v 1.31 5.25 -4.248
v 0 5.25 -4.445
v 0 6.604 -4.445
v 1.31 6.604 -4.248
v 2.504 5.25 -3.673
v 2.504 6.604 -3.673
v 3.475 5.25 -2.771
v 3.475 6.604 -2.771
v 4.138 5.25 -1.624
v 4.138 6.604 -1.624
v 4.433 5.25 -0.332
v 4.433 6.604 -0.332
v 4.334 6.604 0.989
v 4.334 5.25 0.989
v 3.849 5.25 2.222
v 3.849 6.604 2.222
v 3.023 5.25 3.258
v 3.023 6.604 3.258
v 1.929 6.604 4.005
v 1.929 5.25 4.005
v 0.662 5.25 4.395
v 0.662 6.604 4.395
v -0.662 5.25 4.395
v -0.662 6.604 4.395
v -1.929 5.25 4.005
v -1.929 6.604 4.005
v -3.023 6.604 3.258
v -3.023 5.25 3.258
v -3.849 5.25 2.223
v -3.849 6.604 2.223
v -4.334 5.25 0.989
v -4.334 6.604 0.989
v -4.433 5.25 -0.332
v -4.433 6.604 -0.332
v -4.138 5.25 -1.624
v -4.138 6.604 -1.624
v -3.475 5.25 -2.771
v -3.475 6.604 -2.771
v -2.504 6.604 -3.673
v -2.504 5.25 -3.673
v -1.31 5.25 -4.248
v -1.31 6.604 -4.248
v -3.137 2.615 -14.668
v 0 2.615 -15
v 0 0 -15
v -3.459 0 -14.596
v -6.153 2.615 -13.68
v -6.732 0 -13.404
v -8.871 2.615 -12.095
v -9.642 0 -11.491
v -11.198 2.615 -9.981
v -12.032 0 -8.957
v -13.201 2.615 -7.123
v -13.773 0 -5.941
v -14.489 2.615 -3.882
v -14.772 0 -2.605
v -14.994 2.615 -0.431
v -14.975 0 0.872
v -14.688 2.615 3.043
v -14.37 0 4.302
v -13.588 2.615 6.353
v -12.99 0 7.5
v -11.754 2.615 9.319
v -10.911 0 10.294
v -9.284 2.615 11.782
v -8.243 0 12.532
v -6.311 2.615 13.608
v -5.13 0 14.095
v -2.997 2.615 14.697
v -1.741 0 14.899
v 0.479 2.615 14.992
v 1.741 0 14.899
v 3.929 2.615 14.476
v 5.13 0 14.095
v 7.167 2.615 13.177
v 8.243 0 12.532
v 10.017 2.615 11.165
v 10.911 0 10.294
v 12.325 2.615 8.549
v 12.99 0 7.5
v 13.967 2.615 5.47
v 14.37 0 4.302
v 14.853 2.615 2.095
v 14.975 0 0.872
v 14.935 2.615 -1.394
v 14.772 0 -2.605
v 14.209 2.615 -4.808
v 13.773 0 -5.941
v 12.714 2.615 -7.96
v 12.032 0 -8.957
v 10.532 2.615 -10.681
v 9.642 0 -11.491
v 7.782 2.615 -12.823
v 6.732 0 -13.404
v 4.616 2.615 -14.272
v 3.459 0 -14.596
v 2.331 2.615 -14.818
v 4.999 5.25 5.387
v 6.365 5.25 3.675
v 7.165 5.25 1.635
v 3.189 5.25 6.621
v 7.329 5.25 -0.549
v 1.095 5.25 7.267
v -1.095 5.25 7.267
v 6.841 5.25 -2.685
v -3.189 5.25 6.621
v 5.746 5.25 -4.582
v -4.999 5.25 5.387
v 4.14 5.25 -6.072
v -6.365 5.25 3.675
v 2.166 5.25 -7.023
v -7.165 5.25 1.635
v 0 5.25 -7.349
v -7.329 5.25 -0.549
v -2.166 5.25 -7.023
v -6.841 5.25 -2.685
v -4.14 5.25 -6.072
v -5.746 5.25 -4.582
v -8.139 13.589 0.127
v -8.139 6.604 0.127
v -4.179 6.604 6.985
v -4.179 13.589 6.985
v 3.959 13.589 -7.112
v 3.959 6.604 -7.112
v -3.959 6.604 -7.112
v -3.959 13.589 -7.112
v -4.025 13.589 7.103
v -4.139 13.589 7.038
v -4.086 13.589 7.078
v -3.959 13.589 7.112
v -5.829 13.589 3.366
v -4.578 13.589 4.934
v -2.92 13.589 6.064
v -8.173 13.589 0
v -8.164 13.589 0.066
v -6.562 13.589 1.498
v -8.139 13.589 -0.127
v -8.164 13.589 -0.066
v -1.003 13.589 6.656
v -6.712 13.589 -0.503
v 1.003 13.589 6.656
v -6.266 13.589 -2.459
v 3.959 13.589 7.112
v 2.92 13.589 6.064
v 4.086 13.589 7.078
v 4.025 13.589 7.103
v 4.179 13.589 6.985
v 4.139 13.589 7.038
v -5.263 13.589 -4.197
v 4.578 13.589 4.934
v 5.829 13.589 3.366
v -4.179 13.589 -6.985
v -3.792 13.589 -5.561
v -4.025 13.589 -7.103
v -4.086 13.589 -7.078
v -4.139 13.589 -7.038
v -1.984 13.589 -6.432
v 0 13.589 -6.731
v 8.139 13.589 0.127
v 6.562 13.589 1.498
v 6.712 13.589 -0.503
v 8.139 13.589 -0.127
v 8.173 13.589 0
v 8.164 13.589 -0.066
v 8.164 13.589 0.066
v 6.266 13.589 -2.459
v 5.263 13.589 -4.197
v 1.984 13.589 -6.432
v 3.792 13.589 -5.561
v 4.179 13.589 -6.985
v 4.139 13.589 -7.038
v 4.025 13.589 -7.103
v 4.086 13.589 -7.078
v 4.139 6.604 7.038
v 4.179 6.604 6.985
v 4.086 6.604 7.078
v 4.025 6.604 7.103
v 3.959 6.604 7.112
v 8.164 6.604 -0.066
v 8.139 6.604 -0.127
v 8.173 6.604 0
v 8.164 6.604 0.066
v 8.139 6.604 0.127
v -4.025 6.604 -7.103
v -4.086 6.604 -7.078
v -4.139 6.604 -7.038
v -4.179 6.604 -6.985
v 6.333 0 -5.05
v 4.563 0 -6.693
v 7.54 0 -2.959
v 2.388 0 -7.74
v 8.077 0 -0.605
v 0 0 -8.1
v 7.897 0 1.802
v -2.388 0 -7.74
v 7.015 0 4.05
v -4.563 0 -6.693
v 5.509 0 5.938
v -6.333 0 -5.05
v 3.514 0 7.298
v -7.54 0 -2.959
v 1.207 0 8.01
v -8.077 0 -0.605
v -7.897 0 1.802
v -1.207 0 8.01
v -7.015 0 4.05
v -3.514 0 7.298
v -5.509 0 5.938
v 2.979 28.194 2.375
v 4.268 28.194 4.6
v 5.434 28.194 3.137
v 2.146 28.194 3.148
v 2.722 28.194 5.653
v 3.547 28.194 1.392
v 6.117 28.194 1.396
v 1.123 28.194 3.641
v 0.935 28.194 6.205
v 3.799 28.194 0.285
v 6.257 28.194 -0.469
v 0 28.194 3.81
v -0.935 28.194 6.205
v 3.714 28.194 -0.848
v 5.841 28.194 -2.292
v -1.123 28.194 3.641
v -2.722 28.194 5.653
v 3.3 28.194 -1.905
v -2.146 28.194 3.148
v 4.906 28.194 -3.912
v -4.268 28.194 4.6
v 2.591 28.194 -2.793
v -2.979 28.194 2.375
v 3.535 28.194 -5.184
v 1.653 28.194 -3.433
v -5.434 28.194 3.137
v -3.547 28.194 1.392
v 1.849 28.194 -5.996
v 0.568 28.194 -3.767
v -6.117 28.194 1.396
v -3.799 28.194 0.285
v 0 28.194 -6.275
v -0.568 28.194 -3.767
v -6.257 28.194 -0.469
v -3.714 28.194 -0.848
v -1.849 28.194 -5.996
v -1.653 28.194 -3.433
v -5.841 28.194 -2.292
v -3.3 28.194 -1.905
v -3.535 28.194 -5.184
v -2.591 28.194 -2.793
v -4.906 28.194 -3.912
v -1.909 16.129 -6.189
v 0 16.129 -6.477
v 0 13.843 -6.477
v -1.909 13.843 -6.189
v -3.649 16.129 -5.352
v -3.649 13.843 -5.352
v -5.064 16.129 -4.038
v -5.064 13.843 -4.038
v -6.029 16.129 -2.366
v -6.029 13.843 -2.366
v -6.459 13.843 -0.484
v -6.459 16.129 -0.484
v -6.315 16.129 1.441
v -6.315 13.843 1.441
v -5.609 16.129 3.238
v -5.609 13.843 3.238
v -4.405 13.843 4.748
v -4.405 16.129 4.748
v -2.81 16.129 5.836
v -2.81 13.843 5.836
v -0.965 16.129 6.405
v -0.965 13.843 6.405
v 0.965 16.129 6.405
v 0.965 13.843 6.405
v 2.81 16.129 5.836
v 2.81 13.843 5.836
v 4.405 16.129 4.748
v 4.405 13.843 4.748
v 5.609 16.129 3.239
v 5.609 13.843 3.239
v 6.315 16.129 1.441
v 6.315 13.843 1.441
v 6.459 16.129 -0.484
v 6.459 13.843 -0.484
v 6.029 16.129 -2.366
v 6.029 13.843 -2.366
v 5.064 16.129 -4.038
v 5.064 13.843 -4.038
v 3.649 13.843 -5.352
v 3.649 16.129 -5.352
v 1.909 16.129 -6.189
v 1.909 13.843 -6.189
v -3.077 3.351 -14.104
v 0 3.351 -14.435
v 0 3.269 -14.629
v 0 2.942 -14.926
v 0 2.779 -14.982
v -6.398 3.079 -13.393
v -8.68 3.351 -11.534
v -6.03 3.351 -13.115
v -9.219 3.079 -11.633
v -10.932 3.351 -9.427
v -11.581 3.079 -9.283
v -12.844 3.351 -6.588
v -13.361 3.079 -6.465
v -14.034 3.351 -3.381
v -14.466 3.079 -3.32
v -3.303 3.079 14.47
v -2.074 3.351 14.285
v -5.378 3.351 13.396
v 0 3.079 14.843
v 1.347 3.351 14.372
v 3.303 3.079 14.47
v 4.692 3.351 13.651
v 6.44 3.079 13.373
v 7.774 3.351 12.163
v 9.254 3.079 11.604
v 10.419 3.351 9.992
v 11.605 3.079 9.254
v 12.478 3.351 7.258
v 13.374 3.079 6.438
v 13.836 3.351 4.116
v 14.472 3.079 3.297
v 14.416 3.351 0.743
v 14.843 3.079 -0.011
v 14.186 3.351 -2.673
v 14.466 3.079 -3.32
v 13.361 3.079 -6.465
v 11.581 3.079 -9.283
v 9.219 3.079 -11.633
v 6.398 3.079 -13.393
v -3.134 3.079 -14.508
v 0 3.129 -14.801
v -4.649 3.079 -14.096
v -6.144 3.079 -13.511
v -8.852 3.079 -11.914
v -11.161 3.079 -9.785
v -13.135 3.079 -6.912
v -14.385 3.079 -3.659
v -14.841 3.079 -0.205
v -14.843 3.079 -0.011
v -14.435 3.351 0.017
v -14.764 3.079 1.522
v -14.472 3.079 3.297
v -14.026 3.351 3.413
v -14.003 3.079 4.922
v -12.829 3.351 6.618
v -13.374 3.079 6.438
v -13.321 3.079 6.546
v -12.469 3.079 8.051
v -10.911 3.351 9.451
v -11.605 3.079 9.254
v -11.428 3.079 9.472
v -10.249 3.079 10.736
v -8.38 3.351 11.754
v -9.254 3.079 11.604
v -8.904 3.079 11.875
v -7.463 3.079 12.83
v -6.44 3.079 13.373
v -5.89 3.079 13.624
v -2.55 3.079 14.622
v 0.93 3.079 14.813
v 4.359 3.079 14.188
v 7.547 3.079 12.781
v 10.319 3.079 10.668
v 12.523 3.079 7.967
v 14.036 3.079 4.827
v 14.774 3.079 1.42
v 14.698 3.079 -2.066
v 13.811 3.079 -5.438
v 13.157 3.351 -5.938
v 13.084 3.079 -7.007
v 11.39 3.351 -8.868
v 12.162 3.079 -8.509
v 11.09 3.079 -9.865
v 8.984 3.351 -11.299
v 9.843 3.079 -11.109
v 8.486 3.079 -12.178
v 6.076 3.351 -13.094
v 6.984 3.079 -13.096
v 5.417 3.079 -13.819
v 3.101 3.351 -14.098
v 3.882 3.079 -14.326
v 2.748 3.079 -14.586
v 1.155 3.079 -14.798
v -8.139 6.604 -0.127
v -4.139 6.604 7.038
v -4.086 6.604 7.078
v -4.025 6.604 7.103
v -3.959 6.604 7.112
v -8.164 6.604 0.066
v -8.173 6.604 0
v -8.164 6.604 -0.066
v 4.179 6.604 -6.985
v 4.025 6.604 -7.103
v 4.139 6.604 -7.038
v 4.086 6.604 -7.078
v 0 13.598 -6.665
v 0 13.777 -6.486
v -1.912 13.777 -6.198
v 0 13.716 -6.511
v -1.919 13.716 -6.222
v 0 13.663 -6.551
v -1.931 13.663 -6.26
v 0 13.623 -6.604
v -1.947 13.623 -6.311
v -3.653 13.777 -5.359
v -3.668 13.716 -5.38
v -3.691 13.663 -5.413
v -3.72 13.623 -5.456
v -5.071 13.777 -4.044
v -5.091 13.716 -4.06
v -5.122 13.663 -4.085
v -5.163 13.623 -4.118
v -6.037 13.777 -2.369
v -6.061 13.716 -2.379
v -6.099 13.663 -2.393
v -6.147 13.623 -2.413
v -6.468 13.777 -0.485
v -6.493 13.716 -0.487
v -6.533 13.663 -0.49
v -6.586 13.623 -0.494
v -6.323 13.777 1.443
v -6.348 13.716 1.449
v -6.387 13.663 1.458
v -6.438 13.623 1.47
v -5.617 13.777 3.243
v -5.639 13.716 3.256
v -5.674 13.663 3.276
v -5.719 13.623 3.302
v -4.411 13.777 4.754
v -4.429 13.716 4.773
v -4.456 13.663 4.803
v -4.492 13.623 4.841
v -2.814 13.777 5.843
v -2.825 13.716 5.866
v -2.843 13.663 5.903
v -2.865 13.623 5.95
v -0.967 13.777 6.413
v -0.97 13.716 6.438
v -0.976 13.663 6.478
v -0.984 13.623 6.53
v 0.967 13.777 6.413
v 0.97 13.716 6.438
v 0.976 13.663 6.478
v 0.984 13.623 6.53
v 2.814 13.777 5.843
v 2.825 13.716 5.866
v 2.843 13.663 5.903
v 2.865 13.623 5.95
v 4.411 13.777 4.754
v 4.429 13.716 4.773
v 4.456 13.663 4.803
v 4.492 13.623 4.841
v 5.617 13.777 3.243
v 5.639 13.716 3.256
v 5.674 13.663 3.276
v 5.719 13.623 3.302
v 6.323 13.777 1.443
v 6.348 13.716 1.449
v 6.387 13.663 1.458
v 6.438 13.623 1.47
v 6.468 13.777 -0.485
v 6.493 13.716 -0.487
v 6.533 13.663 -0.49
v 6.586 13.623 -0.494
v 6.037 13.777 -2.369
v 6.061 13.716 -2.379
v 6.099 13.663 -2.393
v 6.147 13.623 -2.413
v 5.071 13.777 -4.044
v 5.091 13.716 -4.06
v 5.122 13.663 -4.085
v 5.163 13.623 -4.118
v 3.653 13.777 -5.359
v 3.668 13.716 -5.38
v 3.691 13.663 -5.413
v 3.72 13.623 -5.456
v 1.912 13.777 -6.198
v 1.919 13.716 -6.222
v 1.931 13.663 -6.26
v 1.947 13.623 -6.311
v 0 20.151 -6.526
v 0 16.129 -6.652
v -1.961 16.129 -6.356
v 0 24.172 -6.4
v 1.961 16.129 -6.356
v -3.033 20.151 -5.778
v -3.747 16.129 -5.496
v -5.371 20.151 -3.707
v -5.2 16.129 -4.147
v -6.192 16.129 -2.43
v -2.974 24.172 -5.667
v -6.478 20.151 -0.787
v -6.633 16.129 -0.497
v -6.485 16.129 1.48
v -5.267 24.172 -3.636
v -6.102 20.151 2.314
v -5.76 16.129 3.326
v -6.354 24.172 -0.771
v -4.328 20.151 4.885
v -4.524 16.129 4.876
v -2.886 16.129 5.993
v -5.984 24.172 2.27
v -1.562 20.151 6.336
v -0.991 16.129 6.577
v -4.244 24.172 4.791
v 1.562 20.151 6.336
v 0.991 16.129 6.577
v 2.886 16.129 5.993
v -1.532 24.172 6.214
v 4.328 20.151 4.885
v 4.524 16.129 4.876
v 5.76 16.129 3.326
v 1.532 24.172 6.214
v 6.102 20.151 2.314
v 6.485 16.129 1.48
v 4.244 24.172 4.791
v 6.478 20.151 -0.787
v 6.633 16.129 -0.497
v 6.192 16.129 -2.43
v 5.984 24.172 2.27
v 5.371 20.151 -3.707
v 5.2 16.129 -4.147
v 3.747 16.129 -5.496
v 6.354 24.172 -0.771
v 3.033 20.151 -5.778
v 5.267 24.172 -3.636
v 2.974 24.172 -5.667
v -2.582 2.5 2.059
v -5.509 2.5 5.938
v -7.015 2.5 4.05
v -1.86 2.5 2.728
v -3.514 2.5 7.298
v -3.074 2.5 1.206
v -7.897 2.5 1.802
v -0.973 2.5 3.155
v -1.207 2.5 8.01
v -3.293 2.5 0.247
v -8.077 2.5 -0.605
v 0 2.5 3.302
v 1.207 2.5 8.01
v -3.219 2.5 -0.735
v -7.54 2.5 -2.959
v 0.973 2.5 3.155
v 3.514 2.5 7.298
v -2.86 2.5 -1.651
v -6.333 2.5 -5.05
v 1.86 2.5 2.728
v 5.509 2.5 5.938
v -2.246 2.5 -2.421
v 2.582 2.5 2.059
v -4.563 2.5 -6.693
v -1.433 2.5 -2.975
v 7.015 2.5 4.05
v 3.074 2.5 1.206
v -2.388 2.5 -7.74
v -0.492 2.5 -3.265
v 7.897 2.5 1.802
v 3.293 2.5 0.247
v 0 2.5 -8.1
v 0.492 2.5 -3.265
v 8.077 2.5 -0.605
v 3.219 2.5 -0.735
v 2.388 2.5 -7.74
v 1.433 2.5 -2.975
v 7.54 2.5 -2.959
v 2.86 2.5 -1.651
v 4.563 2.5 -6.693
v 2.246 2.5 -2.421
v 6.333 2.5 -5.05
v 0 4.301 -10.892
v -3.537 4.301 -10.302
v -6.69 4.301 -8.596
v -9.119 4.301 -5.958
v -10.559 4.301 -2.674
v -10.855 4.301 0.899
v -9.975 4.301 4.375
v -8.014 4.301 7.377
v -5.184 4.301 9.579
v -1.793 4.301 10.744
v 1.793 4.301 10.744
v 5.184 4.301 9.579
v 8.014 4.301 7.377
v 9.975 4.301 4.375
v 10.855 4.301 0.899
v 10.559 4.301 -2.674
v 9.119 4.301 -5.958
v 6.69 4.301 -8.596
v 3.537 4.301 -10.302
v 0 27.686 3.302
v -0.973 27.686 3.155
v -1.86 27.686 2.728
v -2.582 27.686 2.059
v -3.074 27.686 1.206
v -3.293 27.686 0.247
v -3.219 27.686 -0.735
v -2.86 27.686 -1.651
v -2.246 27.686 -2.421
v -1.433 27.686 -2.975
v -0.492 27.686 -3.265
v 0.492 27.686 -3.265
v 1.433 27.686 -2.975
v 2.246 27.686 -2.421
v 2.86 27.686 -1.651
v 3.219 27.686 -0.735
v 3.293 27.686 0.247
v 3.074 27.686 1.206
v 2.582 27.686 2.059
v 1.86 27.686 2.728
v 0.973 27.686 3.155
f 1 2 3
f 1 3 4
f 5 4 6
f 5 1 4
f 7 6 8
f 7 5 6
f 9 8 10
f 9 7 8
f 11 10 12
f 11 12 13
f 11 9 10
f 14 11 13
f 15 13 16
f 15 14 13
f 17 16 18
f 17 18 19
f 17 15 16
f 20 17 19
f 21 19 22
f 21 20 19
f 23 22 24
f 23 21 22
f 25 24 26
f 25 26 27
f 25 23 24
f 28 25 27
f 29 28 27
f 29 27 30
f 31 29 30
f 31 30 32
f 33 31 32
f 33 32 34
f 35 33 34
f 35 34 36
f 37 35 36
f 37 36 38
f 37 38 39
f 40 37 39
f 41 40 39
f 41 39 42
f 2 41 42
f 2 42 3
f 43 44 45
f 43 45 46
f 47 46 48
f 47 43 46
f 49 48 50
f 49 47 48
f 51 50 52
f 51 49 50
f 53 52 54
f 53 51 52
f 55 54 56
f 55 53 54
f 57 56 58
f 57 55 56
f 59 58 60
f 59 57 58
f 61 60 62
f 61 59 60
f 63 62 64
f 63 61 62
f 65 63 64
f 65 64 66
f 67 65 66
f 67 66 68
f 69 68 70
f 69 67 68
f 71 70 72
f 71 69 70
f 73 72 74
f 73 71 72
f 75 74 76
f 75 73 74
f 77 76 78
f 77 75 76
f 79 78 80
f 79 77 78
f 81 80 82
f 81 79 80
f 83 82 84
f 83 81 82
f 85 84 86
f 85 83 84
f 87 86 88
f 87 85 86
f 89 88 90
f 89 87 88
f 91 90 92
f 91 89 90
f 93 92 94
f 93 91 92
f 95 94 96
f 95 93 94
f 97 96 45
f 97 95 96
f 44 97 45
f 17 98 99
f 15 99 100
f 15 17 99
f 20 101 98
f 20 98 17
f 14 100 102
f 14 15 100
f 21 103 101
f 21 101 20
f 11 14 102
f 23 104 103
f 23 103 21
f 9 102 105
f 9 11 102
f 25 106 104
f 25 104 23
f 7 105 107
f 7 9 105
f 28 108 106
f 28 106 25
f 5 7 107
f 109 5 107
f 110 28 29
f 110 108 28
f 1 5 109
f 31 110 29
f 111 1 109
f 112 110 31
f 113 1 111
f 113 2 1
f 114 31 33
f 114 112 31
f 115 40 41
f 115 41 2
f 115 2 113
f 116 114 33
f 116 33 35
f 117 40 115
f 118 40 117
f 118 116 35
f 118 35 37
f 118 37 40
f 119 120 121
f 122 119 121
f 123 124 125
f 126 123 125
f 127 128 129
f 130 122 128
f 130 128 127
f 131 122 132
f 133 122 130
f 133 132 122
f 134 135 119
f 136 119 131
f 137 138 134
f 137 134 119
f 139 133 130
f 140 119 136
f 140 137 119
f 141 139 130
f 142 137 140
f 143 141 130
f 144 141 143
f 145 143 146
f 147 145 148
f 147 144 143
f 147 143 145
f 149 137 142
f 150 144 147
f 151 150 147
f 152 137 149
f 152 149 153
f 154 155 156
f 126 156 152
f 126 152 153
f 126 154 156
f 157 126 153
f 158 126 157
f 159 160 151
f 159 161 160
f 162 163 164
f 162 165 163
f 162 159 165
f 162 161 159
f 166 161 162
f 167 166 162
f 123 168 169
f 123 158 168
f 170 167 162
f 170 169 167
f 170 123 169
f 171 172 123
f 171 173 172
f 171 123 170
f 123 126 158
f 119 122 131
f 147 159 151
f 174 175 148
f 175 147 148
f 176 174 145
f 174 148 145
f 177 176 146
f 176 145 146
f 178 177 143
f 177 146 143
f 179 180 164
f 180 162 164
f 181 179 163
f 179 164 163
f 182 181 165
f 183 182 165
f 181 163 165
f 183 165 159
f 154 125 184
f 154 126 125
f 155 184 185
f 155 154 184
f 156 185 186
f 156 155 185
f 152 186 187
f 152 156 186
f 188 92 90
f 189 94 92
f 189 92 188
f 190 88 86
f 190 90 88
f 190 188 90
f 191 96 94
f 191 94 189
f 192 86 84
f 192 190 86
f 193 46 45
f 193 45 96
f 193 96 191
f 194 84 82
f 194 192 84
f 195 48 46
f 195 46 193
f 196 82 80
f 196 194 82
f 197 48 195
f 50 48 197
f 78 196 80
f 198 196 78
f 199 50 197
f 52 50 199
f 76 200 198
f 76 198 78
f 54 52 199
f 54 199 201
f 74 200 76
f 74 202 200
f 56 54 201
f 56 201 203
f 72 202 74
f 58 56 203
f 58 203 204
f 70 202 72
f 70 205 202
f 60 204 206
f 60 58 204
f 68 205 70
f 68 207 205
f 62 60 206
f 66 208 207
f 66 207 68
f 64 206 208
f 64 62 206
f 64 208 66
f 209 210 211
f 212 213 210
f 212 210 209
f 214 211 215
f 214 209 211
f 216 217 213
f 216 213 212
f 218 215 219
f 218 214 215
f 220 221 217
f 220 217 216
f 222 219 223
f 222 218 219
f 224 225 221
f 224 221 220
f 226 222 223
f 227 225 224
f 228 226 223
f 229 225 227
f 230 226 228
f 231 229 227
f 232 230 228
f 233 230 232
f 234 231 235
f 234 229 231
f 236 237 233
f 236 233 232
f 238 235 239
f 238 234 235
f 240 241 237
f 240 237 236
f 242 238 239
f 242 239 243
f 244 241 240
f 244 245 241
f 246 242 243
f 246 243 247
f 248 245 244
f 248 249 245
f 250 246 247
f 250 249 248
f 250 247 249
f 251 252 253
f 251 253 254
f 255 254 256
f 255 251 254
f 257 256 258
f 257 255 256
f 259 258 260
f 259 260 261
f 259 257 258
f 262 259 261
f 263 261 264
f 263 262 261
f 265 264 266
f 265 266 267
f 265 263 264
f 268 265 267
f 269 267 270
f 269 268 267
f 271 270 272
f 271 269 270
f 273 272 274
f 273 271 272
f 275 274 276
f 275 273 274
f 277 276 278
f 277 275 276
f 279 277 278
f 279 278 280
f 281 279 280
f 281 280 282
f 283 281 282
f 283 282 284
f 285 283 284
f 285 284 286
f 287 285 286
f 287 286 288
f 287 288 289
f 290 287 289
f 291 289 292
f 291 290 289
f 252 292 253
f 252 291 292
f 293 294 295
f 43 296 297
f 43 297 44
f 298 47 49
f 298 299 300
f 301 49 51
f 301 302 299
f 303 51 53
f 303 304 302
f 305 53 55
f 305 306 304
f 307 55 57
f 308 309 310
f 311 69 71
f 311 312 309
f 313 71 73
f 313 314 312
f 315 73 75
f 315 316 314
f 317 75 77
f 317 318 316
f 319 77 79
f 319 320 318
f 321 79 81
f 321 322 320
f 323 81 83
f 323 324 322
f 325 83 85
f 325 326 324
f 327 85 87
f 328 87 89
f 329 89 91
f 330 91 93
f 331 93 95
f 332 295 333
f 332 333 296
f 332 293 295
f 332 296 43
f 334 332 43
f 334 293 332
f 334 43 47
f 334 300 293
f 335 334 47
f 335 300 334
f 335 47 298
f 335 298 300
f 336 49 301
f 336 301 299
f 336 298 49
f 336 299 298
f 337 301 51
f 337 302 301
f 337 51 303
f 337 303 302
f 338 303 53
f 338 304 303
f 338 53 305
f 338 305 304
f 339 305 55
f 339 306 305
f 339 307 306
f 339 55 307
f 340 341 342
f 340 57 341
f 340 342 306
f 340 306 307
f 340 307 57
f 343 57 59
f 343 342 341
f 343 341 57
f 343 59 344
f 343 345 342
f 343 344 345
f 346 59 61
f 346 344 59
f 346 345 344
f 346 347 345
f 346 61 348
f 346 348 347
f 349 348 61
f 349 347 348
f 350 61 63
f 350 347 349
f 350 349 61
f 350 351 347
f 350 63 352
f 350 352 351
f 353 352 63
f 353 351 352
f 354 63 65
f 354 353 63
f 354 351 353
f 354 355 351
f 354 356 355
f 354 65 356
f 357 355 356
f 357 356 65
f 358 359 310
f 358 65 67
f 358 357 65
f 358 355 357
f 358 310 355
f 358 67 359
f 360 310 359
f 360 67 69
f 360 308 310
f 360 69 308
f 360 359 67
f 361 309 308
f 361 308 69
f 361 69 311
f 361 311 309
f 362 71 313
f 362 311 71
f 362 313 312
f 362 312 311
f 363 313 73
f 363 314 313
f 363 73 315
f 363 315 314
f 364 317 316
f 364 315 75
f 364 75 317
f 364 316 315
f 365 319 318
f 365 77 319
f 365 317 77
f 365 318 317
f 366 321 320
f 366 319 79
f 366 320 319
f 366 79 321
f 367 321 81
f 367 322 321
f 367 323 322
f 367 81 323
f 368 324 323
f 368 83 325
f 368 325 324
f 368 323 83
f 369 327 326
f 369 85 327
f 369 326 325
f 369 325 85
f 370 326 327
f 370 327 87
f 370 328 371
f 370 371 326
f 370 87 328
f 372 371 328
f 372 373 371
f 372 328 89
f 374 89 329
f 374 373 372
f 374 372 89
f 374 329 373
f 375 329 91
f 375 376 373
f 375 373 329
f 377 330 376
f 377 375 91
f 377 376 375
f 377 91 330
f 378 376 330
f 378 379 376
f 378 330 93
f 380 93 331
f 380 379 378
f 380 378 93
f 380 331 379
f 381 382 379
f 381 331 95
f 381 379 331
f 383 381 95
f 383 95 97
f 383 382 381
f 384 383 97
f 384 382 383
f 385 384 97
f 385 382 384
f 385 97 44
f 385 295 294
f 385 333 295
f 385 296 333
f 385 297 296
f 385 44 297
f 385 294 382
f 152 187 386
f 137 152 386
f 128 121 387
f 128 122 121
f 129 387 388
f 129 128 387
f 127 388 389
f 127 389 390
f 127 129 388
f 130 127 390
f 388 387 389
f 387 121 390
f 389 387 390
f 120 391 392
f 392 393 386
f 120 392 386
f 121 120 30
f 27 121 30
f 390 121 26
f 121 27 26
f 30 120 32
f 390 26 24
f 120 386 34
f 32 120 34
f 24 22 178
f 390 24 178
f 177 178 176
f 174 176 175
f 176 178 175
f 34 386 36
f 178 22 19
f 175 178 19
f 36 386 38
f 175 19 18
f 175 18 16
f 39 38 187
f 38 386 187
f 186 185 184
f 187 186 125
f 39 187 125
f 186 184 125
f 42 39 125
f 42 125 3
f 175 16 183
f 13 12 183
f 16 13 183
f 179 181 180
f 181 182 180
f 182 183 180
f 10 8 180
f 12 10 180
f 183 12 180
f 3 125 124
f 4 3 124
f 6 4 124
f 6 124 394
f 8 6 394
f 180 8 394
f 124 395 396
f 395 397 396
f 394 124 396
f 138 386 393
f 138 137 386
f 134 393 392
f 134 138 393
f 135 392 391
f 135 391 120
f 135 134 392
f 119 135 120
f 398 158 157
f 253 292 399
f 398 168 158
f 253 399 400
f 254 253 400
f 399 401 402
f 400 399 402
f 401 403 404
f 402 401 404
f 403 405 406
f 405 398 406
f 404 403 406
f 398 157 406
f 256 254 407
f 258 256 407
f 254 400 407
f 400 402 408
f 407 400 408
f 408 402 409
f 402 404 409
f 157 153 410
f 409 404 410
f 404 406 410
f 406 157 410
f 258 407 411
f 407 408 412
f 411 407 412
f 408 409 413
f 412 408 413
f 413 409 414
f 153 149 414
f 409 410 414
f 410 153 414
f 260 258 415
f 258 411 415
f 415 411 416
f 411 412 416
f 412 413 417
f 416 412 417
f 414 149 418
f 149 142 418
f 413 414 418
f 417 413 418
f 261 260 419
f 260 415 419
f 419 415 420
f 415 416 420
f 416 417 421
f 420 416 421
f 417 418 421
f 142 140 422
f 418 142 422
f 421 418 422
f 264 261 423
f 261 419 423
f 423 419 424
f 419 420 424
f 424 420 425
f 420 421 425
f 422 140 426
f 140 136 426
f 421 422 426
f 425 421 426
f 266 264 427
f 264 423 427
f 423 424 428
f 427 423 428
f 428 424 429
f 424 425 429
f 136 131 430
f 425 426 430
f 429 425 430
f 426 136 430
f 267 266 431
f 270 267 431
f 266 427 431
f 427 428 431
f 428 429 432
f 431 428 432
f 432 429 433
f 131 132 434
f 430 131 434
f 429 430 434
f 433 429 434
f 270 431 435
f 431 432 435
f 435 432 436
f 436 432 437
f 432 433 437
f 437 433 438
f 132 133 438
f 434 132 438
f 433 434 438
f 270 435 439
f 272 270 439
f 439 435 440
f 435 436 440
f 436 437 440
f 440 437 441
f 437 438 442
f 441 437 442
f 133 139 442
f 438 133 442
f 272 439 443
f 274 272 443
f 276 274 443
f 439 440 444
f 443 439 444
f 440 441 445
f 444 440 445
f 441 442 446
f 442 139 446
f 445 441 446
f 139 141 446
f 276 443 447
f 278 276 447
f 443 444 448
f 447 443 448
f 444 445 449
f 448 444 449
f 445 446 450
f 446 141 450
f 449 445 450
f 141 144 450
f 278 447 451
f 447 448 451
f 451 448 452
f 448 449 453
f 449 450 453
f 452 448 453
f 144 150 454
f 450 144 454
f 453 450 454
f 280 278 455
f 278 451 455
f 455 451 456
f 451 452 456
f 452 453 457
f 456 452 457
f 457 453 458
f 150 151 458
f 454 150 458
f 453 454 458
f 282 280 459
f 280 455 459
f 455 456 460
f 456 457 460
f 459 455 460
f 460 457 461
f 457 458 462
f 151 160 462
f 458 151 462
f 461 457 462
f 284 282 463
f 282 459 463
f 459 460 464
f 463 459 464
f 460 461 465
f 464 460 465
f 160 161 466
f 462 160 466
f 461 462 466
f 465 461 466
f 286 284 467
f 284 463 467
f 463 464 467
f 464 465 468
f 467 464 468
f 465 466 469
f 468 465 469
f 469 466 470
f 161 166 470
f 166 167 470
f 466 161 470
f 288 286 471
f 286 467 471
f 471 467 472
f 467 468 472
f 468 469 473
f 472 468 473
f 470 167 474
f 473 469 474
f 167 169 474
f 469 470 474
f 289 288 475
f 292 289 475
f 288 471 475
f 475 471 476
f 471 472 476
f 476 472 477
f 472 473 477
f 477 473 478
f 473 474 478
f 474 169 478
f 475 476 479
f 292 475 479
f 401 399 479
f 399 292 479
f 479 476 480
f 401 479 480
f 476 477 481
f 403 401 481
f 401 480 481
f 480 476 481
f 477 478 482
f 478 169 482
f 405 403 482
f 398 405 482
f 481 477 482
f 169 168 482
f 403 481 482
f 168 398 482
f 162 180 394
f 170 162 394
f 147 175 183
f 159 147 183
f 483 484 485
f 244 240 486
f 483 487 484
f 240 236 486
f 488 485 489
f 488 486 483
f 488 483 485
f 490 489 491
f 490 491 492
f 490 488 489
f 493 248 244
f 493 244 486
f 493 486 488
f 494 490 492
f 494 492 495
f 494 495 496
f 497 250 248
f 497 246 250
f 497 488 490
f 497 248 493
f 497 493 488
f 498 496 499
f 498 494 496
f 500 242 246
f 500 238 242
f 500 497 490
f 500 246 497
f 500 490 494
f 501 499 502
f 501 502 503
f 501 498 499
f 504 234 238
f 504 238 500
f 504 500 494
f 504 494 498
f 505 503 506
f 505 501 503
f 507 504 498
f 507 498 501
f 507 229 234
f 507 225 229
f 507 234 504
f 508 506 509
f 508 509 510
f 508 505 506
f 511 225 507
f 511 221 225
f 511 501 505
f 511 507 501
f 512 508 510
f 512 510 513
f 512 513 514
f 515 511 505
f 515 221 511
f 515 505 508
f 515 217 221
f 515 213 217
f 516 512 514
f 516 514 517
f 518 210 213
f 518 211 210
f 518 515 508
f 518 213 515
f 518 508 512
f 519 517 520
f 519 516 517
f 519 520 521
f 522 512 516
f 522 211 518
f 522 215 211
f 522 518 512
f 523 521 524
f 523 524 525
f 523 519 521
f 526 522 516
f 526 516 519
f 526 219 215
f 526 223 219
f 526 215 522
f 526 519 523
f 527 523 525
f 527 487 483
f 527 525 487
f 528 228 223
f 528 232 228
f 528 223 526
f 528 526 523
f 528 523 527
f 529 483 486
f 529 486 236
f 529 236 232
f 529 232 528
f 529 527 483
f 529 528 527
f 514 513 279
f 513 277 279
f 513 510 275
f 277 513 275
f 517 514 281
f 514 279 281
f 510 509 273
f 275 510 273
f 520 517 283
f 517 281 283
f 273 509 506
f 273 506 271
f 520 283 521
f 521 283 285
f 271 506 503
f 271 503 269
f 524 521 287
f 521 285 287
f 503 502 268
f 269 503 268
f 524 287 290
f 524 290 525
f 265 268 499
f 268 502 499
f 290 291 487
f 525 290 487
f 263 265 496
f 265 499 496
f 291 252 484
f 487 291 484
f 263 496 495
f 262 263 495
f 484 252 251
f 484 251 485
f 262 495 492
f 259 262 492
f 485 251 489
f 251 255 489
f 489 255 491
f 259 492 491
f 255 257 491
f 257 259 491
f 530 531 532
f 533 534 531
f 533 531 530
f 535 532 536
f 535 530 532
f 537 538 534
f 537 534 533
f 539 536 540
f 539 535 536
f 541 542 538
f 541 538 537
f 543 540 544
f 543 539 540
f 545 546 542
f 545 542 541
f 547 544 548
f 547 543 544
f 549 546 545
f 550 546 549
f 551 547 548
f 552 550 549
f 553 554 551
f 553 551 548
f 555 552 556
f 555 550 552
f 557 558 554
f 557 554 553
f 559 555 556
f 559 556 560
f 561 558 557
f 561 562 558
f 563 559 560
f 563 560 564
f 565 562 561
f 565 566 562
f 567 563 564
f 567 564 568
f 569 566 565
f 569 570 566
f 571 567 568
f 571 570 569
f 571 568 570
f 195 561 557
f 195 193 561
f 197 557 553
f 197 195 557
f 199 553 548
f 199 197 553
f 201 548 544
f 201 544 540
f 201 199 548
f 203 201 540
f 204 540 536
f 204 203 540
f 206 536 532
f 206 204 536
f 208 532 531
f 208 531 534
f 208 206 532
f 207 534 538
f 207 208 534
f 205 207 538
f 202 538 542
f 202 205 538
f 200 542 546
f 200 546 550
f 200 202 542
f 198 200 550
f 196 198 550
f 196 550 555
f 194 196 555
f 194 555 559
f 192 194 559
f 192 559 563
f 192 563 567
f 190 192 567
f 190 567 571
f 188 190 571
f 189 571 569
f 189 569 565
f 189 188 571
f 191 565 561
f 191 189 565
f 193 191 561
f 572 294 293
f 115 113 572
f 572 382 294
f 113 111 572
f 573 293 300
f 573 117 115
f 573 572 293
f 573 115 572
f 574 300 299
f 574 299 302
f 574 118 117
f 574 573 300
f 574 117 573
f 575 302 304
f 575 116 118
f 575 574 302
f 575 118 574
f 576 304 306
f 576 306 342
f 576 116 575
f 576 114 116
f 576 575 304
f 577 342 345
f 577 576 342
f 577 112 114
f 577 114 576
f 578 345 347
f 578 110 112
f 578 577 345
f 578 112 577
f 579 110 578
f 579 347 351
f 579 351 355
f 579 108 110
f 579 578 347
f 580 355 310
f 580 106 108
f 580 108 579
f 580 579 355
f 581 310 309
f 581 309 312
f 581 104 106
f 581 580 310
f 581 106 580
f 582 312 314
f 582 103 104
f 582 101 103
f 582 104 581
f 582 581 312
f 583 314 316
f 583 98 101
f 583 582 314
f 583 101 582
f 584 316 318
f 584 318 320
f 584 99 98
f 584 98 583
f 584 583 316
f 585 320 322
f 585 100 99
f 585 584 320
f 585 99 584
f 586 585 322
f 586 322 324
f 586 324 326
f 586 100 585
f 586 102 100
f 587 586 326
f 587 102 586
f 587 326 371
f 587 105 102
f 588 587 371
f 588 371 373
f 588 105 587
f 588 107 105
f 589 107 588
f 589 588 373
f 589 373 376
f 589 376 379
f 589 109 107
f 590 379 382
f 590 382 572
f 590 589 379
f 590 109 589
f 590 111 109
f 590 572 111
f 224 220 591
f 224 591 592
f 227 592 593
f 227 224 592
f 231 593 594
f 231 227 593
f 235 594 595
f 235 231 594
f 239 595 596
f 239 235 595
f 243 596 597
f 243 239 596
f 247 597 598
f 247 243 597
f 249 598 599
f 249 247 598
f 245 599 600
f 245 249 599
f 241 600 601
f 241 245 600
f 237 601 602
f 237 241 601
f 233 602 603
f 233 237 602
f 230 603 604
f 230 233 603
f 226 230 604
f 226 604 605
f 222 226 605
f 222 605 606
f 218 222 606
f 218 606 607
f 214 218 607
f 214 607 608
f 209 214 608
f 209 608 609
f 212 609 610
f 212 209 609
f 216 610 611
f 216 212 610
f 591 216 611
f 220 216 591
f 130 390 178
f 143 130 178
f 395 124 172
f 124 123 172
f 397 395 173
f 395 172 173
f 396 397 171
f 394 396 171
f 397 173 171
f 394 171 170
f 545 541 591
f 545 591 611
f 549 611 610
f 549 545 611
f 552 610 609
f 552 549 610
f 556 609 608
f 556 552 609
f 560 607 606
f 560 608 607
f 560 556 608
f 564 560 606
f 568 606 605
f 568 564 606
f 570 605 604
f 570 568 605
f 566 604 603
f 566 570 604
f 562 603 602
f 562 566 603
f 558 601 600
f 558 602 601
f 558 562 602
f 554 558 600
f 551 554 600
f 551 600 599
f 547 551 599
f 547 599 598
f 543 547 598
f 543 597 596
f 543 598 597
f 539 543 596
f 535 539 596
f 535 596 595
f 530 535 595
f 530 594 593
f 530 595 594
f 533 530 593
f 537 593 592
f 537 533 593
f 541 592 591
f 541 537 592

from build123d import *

# Parameters (mm, degrees)
SKETCH5_R         = 4.445
STUB_DEPTH        = 4.104
HEX_2_DEPTH       = 6.985
SKETCH11_W        = 15.24
SKETCH11_H        = 2.54
SKETCH3_R         = 3.302
CENTER_BORE_DEPTH = 36.283163634
FILLET1_R         = 0.254
FILLET2_R         = 0.762
CHAMFER1_SIZE     = 0.508
FILLET3_R         = 0.254


with BuildPart() as part:
    # Sketch1 → Flange (revolve)
    with BuildSketch(Plane(origin=(0, 0, 0), x_dir=(0, 0, -1), z_dir=(1, 0, 0)), mode=Mode.PRIVATE) as flange_sk:
        Polygon((-15, 0), (-15, 3.2), (-7.349295844, 5.25), (0, 5.25), (0, 2.5), (-8.1, 2.5), (-8.1, 0), align=None)
    revolve(flange_sk.sketch.rotate(Axis((0, 0, 0), (0, 1, 0)), 180), axis=Axis((0, 0, 0), (0, 1, 0)))

    # Sketch5 → Stub (add)
    with BuildSketch(Plane.XZ.offset(-2.5)):
        with Locations(Location((0, 0, 0), (0, 0, 270))):
            Circle(SKETCH5_R)
    extrude(amount=-STUB_DEPTH)

    # Sketch6 → Hex 2 (add)
    with BuildSketch(Plane(origin=(0, 6.604, 0), x_dir=(1, 0, 0), z_dir=(0, 1, 0))):
        Polygon((4.106115114, 7.112), (-4.106115114, 7.112), (-8.212230229, 0), (-4.106115114, -7.112), (4.106115114, -7.112), (8.212230229, 0), align=None)
    extrude(amount=HEX_2_DEPTH)

    # Sketch7 → Thread Body (revolve)
    with BuildSketch(Plane.XY, mode=Mode.PRIVATE) as thread_body_sk:
        Polygon((-6.731, 13.589), (-6.274596457, 28.194), (0, 28.194), (0, 13.589), align=None)
    revolve(thread_body_sk.sketch.rotate(Axis((0, 0, 0), (0, 1, 0)), 270), axis=Axis((0, 0, 0), (0, 1, 0)))

    # Sketch11 → Cut-Revolve1 (revolve, cut)
    with BuildSketch(Plane.XY, mode=Mode.PRIVATE) as cut_revolve1_sk:
        with Locations((-14.097, 14.859)):
            Rectangle(SKETCH11_W, SKETCH11_H)
    revolve(cut_revolve1_sk.sketch.rotate(Axis((0, 0, 0), (0, 1, 0)), 270), axis=Axis((0, 0, 0), (0, 1, 0)), mode=Mode.SUBTRACT)

    # Sketch3 → Center Bore (cut, through all)
    with BuildSketch(Plane(origin=(0, 0, 0), x_dir=(1, 0, 0), z_dir=(0, 1, 0))):
        with Locations(Location((0, 0, 0), (0, 0, 270))):
            Circle(SKETCH3_R)
    extrude(amount=CENTER_BORE_DEPTH, mode=Mode.SUBTRACT)

    # Fillet1
    fillet1_edges = [part.edges().sort_by_distance(p)[0] for p in [
        (8.212230229, 10.0965, 0),
        (4.106115114, 10.0965, -7.112),
        (-4.106115114, 10.0965, -7.112),
        (-8.212230229, 10.0965, 0),
        (-4.106115114, 10.0965, 7.112),
        (4.106115114, 10.0965, 7.112),
    ]]
    fillet(fillet1_edges, radius=FILLET1_R)

    # Fillet2
    fillet2_edges = [part.edges().sort_by_distance(p)[0] for p in [
        (0, 3.2, 15),
    ]]
    fillet(fillet2_edges, radius=FILLET2_R)

    # Chamfer1
    chamfer1_edges = [part.edges().sort_by_distance(p)[0] for p in [
        (0, 28.194, -3.302),
    ]]
    chamfer(chamfer1_edges, length=CHAMFER1_SIZE)

    # Fillet3
    fillet3_edges = [part.edges().sort_by_distance(p)[0] for p in [
        (0, 13.589, 6.477),
    ]]
    fillet(fillet3_edges, radius=FILLET3_R)


solid = part.part
